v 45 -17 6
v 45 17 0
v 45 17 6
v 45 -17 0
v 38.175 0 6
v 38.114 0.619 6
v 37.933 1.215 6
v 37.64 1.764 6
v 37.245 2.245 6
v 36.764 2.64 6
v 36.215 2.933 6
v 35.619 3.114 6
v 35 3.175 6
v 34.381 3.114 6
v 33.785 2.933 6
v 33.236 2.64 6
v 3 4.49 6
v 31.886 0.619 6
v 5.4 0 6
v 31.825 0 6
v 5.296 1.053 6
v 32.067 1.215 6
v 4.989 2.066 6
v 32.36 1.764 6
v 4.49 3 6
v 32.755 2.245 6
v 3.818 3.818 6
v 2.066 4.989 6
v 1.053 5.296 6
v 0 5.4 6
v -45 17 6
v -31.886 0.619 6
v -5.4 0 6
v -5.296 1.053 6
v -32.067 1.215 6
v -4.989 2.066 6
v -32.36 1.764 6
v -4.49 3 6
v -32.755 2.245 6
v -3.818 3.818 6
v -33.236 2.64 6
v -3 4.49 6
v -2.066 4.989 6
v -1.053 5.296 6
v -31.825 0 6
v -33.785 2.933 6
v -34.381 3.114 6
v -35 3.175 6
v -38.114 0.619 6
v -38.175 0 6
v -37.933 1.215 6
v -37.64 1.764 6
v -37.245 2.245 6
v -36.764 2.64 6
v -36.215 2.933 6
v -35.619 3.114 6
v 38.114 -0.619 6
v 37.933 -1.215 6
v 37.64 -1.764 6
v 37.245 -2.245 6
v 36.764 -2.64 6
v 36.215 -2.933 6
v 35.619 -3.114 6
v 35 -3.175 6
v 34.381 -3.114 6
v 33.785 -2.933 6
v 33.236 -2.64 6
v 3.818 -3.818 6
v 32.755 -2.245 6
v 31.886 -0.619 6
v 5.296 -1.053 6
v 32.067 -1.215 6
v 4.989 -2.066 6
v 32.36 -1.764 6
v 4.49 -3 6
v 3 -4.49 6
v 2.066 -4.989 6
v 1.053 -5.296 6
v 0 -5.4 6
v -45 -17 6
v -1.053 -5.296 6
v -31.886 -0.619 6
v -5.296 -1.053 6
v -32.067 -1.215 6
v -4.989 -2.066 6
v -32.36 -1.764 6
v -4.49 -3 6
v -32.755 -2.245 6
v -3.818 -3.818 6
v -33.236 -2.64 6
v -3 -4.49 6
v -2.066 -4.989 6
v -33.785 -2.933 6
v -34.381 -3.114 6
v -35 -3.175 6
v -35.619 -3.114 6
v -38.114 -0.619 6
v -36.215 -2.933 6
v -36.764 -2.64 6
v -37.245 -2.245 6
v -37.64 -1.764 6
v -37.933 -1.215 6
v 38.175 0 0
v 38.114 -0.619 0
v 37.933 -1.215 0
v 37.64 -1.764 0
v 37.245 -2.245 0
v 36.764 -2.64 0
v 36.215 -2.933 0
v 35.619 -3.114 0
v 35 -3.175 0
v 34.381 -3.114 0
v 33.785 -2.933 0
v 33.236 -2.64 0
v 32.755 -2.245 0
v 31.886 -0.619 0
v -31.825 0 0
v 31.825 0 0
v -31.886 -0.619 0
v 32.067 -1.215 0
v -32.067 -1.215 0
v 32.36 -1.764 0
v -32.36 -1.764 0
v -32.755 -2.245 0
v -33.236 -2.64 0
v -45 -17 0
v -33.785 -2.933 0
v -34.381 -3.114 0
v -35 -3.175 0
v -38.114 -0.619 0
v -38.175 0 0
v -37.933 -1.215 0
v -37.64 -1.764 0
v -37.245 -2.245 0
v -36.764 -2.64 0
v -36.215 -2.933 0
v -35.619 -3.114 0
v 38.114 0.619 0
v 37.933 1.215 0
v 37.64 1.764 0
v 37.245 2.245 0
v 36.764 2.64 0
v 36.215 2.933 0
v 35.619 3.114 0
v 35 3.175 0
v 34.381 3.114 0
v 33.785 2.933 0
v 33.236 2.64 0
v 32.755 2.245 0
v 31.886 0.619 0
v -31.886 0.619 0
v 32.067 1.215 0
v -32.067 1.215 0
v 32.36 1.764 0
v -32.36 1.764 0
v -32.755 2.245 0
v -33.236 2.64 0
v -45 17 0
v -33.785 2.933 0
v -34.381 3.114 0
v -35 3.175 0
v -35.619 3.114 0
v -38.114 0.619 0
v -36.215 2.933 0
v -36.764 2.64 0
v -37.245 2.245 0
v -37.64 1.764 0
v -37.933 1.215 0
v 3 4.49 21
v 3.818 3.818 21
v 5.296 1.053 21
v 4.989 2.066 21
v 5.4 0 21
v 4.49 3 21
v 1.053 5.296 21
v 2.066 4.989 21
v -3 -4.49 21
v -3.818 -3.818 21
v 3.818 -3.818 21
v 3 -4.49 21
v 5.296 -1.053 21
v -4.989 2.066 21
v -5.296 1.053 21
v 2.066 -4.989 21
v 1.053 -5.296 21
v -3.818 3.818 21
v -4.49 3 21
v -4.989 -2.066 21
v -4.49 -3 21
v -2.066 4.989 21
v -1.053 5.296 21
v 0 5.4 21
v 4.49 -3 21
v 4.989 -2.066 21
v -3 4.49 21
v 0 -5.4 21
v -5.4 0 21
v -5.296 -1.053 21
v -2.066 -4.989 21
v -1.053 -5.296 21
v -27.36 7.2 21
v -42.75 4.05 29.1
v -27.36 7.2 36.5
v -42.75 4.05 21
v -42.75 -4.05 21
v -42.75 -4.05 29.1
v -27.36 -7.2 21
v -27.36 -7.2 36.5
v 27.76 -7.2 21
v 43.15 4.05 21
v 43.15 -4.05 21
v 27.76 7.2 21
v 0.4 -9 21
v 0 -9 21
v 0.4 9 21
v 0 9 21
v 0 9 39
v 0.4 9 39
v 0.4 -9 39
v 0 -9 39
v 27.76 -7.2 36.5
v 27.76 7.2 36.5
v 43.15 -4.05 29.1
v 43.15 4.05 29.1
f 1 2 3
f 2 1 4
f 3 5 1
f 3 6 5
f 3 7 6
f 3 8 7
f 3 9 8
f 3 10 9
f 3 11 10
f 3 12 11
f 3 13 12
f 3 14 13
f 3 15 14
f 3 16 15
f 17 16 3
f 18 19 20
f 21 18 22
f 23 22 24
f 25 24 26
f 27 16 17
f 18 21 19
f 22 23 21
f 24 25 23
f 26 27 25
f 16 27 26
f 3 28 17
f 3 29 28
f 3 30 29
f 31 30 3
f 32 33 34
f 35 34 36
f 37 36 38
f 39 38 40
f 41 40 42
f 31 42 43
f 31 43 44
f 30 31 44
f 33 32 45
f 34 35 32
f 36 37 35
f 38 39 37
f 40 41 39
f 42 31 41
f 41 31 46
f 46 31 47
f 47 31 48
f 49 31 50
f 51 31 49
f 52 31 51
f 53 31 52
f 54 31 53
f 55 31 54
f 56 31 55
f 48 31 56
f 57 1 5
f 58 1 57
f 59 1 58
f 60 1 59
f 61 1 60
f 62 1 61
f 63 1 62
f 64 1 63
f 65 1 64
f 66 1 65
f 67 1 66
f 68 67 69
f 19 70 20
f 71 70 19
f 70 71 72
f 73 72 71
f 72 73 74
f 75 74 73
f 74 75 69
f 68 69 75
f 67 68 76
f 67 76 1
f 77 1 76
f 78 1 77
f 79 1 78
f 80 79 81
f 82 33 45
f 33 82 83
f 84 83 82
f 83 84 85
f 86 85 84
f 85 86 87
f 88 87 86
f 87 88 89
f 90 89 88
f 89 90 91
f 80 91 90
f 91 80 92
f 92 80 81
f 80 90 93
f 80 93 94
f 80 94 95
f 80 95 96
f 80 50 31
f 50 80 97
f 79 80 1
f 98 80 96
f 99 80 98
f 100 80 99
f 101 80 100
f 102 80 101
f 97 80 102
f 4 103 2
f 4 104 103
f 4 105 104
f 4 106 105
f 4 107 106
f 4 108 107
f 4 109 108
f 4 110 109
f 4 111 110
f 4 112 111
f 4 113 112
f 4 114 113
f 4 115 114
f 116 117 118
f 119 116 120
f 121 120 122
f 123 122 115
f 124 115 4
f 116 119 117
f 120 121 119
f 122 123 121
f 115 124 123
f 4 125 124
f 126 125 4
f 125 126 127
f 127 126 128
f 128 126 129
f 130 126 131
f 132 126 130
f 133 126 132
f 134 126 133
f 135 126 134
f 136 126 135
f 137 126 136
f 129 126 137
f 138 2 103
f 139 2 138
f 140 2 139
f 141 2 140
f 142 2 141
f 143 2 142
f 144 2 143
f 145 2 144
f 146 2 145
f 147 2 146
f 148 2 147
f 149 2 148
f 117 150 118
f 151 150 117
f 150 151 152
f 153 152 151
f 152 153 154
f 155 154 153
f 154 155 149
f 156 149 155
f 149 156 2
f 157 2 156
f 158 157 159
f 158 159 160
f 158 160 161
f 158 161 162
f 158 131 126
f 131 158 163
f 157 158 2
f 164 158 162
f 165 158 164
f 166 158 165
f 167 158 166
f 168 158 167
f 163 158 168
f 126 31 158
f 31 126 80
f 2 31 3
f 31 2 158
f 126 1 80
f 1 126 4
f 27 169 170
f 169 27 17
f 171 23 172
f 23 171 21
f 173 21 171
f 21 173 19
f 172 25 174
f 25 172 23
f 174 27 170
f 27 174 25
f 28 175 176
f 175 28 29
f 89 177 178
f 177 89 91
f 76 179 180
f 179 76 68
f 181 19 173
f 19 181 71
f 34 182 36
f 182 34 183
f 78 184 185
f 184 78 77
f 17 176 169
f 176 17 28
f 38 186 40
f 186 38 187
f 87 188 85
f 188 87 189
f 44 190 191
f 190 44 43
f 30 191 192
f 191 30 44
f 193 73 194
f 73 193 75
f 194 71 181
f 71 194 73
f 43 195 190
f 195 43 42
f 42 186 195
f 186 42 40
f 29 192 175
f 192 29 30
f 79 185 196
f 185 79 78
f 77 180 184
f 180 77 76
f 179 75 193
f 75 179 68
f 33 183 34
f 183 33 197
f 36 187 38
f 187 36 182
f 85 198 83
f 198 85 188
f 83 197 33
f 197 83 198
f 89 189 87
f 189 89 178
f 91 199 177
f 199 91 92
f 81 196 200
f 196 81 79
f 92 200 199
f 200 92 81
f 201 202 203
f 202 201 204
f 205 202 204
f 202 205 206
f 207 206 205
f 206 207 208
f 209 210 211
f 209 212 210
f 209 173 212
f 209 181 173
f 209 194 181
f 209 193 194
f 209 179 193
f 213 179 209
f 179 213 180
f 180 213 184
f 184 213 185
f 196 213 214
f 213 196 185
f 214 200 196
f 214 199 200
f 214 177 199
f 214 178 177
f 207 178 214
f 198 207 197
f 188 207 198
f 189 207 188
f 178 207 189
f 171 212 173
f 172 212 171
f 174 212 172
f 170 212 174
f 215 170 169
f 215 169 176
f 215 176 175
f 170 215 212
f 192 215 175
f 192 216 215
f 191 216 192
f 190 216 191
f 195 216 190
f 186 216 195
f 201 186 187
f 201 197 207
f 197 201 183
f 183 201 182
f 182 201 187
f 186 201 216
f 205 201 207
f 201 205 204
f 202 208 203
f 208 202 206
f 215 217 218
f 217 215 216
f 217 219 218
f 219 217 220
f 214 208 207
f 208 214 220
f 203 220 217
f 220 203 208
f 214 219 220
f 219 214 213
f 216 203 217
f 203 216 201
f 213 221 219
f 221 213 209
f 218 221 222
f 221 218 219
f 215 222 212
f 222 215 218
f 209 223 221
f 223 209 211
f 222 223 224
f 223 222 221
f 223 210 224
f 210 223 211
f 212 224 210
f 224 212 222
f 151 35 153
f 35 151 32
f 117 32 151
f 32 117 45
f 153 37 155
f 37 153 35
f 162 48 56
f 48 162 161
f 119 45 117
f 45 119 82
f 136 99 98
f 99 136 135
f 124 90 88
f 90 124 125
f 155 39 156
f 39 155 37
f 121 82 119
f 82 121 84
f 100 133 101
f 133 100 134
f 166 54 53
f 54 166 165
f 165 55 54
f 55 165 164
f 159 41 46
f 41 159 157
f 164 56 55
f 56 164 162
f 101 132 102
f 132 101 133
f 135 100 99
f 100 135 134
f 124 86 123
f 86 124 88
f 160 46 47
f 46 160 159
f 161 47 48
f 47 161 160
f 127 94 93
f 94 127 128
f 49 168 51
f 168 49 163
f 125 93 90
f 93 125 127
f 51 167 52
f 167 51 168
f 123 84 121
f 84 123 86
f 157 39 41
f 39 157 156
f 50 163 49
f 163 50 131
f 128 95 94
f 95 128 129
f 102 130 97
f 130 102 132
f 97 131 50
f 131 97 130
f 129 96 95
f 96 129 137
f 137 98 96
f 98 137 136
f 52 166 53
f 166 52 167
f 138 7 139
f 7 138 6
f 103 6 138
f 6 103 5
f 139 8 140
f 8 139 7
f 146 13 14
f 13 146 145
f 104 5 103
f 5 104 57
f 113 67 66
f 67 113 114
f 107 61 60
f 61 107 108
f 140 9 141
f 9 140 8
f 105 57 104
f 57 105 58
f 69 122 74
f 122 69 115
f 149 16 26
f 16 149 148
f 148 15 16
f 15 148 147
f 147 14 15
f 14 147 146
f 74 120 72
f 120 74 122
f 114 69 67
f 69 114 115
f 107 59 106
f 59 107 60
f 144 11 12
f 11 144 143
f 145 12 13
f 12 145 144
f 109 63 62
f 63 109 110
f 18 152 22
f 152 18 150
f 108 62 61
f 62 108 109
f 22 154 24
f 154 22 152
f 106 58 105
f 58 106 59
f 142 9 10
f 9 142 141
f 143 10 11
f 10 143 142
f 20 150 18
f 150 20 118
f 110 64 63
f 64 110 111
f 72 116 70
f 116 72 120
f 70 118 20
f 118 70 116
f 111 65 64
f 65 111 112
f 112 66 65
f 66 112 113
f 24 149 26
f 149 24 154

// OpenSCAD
$fn = 32;

// ----------------------------------------------------------------------
// Boat cleat: 90 mm base, horn 30 mm up
// ----------------------------------------------------------------------

// --- parameters (mm) ---
base_l = 90;              // base length
base_w = 34;              // base width
base_t = 6;               // base thickness
horn_len = 85.5;          // horn length
horn_d = 18;              // horn diameter at the middle
horn_z = 30;              // horn axis height
end_drop = 10;            // how far the horn tips drop
post_d = 10.8;            // centre post diameter
holes_d = 6.35;           // fixing holes
hole_x = 35;              // fixing hole spacing

difference() {
  union() {
    translate([-45, -17, 0]) cube([base_l, base_w, base_t]);
    /* centre post, sunk 1 mm into the base */
    translate([0, 0, 5]) cylinder(h = 25, d = post_d);
    /* horn: a hull chain of boxes, full in the middle and lighter at the tips */
    hull() {
      translate([-42.75, -4.05, 21]) cube([0.4, 8.1, 8.1], center = false);
      translate([-27.36, -7.2, 21]) cube([0.4, 14.4, 15.5], center = false);
    }
    hull() {
      translate([-27.36, -7.2, 21]) cube([0.4, 14.4, 15.5], center = false);
      translate([0, -9, 21]) cube([0.4, 18, 18], center = false);
    }
    hull() {
      translate([0, -9, 21]) cube([0.4, 18, 18], center = false);
      translate([27.36, -7.2, 21]) cube([0.4, 14.4, 15.5], center = false);
    }
    hull() {
      translate([27.36, -7.2, 21]) cube([0.4, 14.4, 15.5], center = false);
      translate([42.75, -4.05, 21]) cube([0.4, 8.1, 8.1], center = false);
    }
  }
  translate([-35, 0, -2.5]) cylinder(h = base_t + 5, d = holes_d);
  translate([35, 0, -2.5]) cylinder(h = base_t + 5, d = holes_d);
}
